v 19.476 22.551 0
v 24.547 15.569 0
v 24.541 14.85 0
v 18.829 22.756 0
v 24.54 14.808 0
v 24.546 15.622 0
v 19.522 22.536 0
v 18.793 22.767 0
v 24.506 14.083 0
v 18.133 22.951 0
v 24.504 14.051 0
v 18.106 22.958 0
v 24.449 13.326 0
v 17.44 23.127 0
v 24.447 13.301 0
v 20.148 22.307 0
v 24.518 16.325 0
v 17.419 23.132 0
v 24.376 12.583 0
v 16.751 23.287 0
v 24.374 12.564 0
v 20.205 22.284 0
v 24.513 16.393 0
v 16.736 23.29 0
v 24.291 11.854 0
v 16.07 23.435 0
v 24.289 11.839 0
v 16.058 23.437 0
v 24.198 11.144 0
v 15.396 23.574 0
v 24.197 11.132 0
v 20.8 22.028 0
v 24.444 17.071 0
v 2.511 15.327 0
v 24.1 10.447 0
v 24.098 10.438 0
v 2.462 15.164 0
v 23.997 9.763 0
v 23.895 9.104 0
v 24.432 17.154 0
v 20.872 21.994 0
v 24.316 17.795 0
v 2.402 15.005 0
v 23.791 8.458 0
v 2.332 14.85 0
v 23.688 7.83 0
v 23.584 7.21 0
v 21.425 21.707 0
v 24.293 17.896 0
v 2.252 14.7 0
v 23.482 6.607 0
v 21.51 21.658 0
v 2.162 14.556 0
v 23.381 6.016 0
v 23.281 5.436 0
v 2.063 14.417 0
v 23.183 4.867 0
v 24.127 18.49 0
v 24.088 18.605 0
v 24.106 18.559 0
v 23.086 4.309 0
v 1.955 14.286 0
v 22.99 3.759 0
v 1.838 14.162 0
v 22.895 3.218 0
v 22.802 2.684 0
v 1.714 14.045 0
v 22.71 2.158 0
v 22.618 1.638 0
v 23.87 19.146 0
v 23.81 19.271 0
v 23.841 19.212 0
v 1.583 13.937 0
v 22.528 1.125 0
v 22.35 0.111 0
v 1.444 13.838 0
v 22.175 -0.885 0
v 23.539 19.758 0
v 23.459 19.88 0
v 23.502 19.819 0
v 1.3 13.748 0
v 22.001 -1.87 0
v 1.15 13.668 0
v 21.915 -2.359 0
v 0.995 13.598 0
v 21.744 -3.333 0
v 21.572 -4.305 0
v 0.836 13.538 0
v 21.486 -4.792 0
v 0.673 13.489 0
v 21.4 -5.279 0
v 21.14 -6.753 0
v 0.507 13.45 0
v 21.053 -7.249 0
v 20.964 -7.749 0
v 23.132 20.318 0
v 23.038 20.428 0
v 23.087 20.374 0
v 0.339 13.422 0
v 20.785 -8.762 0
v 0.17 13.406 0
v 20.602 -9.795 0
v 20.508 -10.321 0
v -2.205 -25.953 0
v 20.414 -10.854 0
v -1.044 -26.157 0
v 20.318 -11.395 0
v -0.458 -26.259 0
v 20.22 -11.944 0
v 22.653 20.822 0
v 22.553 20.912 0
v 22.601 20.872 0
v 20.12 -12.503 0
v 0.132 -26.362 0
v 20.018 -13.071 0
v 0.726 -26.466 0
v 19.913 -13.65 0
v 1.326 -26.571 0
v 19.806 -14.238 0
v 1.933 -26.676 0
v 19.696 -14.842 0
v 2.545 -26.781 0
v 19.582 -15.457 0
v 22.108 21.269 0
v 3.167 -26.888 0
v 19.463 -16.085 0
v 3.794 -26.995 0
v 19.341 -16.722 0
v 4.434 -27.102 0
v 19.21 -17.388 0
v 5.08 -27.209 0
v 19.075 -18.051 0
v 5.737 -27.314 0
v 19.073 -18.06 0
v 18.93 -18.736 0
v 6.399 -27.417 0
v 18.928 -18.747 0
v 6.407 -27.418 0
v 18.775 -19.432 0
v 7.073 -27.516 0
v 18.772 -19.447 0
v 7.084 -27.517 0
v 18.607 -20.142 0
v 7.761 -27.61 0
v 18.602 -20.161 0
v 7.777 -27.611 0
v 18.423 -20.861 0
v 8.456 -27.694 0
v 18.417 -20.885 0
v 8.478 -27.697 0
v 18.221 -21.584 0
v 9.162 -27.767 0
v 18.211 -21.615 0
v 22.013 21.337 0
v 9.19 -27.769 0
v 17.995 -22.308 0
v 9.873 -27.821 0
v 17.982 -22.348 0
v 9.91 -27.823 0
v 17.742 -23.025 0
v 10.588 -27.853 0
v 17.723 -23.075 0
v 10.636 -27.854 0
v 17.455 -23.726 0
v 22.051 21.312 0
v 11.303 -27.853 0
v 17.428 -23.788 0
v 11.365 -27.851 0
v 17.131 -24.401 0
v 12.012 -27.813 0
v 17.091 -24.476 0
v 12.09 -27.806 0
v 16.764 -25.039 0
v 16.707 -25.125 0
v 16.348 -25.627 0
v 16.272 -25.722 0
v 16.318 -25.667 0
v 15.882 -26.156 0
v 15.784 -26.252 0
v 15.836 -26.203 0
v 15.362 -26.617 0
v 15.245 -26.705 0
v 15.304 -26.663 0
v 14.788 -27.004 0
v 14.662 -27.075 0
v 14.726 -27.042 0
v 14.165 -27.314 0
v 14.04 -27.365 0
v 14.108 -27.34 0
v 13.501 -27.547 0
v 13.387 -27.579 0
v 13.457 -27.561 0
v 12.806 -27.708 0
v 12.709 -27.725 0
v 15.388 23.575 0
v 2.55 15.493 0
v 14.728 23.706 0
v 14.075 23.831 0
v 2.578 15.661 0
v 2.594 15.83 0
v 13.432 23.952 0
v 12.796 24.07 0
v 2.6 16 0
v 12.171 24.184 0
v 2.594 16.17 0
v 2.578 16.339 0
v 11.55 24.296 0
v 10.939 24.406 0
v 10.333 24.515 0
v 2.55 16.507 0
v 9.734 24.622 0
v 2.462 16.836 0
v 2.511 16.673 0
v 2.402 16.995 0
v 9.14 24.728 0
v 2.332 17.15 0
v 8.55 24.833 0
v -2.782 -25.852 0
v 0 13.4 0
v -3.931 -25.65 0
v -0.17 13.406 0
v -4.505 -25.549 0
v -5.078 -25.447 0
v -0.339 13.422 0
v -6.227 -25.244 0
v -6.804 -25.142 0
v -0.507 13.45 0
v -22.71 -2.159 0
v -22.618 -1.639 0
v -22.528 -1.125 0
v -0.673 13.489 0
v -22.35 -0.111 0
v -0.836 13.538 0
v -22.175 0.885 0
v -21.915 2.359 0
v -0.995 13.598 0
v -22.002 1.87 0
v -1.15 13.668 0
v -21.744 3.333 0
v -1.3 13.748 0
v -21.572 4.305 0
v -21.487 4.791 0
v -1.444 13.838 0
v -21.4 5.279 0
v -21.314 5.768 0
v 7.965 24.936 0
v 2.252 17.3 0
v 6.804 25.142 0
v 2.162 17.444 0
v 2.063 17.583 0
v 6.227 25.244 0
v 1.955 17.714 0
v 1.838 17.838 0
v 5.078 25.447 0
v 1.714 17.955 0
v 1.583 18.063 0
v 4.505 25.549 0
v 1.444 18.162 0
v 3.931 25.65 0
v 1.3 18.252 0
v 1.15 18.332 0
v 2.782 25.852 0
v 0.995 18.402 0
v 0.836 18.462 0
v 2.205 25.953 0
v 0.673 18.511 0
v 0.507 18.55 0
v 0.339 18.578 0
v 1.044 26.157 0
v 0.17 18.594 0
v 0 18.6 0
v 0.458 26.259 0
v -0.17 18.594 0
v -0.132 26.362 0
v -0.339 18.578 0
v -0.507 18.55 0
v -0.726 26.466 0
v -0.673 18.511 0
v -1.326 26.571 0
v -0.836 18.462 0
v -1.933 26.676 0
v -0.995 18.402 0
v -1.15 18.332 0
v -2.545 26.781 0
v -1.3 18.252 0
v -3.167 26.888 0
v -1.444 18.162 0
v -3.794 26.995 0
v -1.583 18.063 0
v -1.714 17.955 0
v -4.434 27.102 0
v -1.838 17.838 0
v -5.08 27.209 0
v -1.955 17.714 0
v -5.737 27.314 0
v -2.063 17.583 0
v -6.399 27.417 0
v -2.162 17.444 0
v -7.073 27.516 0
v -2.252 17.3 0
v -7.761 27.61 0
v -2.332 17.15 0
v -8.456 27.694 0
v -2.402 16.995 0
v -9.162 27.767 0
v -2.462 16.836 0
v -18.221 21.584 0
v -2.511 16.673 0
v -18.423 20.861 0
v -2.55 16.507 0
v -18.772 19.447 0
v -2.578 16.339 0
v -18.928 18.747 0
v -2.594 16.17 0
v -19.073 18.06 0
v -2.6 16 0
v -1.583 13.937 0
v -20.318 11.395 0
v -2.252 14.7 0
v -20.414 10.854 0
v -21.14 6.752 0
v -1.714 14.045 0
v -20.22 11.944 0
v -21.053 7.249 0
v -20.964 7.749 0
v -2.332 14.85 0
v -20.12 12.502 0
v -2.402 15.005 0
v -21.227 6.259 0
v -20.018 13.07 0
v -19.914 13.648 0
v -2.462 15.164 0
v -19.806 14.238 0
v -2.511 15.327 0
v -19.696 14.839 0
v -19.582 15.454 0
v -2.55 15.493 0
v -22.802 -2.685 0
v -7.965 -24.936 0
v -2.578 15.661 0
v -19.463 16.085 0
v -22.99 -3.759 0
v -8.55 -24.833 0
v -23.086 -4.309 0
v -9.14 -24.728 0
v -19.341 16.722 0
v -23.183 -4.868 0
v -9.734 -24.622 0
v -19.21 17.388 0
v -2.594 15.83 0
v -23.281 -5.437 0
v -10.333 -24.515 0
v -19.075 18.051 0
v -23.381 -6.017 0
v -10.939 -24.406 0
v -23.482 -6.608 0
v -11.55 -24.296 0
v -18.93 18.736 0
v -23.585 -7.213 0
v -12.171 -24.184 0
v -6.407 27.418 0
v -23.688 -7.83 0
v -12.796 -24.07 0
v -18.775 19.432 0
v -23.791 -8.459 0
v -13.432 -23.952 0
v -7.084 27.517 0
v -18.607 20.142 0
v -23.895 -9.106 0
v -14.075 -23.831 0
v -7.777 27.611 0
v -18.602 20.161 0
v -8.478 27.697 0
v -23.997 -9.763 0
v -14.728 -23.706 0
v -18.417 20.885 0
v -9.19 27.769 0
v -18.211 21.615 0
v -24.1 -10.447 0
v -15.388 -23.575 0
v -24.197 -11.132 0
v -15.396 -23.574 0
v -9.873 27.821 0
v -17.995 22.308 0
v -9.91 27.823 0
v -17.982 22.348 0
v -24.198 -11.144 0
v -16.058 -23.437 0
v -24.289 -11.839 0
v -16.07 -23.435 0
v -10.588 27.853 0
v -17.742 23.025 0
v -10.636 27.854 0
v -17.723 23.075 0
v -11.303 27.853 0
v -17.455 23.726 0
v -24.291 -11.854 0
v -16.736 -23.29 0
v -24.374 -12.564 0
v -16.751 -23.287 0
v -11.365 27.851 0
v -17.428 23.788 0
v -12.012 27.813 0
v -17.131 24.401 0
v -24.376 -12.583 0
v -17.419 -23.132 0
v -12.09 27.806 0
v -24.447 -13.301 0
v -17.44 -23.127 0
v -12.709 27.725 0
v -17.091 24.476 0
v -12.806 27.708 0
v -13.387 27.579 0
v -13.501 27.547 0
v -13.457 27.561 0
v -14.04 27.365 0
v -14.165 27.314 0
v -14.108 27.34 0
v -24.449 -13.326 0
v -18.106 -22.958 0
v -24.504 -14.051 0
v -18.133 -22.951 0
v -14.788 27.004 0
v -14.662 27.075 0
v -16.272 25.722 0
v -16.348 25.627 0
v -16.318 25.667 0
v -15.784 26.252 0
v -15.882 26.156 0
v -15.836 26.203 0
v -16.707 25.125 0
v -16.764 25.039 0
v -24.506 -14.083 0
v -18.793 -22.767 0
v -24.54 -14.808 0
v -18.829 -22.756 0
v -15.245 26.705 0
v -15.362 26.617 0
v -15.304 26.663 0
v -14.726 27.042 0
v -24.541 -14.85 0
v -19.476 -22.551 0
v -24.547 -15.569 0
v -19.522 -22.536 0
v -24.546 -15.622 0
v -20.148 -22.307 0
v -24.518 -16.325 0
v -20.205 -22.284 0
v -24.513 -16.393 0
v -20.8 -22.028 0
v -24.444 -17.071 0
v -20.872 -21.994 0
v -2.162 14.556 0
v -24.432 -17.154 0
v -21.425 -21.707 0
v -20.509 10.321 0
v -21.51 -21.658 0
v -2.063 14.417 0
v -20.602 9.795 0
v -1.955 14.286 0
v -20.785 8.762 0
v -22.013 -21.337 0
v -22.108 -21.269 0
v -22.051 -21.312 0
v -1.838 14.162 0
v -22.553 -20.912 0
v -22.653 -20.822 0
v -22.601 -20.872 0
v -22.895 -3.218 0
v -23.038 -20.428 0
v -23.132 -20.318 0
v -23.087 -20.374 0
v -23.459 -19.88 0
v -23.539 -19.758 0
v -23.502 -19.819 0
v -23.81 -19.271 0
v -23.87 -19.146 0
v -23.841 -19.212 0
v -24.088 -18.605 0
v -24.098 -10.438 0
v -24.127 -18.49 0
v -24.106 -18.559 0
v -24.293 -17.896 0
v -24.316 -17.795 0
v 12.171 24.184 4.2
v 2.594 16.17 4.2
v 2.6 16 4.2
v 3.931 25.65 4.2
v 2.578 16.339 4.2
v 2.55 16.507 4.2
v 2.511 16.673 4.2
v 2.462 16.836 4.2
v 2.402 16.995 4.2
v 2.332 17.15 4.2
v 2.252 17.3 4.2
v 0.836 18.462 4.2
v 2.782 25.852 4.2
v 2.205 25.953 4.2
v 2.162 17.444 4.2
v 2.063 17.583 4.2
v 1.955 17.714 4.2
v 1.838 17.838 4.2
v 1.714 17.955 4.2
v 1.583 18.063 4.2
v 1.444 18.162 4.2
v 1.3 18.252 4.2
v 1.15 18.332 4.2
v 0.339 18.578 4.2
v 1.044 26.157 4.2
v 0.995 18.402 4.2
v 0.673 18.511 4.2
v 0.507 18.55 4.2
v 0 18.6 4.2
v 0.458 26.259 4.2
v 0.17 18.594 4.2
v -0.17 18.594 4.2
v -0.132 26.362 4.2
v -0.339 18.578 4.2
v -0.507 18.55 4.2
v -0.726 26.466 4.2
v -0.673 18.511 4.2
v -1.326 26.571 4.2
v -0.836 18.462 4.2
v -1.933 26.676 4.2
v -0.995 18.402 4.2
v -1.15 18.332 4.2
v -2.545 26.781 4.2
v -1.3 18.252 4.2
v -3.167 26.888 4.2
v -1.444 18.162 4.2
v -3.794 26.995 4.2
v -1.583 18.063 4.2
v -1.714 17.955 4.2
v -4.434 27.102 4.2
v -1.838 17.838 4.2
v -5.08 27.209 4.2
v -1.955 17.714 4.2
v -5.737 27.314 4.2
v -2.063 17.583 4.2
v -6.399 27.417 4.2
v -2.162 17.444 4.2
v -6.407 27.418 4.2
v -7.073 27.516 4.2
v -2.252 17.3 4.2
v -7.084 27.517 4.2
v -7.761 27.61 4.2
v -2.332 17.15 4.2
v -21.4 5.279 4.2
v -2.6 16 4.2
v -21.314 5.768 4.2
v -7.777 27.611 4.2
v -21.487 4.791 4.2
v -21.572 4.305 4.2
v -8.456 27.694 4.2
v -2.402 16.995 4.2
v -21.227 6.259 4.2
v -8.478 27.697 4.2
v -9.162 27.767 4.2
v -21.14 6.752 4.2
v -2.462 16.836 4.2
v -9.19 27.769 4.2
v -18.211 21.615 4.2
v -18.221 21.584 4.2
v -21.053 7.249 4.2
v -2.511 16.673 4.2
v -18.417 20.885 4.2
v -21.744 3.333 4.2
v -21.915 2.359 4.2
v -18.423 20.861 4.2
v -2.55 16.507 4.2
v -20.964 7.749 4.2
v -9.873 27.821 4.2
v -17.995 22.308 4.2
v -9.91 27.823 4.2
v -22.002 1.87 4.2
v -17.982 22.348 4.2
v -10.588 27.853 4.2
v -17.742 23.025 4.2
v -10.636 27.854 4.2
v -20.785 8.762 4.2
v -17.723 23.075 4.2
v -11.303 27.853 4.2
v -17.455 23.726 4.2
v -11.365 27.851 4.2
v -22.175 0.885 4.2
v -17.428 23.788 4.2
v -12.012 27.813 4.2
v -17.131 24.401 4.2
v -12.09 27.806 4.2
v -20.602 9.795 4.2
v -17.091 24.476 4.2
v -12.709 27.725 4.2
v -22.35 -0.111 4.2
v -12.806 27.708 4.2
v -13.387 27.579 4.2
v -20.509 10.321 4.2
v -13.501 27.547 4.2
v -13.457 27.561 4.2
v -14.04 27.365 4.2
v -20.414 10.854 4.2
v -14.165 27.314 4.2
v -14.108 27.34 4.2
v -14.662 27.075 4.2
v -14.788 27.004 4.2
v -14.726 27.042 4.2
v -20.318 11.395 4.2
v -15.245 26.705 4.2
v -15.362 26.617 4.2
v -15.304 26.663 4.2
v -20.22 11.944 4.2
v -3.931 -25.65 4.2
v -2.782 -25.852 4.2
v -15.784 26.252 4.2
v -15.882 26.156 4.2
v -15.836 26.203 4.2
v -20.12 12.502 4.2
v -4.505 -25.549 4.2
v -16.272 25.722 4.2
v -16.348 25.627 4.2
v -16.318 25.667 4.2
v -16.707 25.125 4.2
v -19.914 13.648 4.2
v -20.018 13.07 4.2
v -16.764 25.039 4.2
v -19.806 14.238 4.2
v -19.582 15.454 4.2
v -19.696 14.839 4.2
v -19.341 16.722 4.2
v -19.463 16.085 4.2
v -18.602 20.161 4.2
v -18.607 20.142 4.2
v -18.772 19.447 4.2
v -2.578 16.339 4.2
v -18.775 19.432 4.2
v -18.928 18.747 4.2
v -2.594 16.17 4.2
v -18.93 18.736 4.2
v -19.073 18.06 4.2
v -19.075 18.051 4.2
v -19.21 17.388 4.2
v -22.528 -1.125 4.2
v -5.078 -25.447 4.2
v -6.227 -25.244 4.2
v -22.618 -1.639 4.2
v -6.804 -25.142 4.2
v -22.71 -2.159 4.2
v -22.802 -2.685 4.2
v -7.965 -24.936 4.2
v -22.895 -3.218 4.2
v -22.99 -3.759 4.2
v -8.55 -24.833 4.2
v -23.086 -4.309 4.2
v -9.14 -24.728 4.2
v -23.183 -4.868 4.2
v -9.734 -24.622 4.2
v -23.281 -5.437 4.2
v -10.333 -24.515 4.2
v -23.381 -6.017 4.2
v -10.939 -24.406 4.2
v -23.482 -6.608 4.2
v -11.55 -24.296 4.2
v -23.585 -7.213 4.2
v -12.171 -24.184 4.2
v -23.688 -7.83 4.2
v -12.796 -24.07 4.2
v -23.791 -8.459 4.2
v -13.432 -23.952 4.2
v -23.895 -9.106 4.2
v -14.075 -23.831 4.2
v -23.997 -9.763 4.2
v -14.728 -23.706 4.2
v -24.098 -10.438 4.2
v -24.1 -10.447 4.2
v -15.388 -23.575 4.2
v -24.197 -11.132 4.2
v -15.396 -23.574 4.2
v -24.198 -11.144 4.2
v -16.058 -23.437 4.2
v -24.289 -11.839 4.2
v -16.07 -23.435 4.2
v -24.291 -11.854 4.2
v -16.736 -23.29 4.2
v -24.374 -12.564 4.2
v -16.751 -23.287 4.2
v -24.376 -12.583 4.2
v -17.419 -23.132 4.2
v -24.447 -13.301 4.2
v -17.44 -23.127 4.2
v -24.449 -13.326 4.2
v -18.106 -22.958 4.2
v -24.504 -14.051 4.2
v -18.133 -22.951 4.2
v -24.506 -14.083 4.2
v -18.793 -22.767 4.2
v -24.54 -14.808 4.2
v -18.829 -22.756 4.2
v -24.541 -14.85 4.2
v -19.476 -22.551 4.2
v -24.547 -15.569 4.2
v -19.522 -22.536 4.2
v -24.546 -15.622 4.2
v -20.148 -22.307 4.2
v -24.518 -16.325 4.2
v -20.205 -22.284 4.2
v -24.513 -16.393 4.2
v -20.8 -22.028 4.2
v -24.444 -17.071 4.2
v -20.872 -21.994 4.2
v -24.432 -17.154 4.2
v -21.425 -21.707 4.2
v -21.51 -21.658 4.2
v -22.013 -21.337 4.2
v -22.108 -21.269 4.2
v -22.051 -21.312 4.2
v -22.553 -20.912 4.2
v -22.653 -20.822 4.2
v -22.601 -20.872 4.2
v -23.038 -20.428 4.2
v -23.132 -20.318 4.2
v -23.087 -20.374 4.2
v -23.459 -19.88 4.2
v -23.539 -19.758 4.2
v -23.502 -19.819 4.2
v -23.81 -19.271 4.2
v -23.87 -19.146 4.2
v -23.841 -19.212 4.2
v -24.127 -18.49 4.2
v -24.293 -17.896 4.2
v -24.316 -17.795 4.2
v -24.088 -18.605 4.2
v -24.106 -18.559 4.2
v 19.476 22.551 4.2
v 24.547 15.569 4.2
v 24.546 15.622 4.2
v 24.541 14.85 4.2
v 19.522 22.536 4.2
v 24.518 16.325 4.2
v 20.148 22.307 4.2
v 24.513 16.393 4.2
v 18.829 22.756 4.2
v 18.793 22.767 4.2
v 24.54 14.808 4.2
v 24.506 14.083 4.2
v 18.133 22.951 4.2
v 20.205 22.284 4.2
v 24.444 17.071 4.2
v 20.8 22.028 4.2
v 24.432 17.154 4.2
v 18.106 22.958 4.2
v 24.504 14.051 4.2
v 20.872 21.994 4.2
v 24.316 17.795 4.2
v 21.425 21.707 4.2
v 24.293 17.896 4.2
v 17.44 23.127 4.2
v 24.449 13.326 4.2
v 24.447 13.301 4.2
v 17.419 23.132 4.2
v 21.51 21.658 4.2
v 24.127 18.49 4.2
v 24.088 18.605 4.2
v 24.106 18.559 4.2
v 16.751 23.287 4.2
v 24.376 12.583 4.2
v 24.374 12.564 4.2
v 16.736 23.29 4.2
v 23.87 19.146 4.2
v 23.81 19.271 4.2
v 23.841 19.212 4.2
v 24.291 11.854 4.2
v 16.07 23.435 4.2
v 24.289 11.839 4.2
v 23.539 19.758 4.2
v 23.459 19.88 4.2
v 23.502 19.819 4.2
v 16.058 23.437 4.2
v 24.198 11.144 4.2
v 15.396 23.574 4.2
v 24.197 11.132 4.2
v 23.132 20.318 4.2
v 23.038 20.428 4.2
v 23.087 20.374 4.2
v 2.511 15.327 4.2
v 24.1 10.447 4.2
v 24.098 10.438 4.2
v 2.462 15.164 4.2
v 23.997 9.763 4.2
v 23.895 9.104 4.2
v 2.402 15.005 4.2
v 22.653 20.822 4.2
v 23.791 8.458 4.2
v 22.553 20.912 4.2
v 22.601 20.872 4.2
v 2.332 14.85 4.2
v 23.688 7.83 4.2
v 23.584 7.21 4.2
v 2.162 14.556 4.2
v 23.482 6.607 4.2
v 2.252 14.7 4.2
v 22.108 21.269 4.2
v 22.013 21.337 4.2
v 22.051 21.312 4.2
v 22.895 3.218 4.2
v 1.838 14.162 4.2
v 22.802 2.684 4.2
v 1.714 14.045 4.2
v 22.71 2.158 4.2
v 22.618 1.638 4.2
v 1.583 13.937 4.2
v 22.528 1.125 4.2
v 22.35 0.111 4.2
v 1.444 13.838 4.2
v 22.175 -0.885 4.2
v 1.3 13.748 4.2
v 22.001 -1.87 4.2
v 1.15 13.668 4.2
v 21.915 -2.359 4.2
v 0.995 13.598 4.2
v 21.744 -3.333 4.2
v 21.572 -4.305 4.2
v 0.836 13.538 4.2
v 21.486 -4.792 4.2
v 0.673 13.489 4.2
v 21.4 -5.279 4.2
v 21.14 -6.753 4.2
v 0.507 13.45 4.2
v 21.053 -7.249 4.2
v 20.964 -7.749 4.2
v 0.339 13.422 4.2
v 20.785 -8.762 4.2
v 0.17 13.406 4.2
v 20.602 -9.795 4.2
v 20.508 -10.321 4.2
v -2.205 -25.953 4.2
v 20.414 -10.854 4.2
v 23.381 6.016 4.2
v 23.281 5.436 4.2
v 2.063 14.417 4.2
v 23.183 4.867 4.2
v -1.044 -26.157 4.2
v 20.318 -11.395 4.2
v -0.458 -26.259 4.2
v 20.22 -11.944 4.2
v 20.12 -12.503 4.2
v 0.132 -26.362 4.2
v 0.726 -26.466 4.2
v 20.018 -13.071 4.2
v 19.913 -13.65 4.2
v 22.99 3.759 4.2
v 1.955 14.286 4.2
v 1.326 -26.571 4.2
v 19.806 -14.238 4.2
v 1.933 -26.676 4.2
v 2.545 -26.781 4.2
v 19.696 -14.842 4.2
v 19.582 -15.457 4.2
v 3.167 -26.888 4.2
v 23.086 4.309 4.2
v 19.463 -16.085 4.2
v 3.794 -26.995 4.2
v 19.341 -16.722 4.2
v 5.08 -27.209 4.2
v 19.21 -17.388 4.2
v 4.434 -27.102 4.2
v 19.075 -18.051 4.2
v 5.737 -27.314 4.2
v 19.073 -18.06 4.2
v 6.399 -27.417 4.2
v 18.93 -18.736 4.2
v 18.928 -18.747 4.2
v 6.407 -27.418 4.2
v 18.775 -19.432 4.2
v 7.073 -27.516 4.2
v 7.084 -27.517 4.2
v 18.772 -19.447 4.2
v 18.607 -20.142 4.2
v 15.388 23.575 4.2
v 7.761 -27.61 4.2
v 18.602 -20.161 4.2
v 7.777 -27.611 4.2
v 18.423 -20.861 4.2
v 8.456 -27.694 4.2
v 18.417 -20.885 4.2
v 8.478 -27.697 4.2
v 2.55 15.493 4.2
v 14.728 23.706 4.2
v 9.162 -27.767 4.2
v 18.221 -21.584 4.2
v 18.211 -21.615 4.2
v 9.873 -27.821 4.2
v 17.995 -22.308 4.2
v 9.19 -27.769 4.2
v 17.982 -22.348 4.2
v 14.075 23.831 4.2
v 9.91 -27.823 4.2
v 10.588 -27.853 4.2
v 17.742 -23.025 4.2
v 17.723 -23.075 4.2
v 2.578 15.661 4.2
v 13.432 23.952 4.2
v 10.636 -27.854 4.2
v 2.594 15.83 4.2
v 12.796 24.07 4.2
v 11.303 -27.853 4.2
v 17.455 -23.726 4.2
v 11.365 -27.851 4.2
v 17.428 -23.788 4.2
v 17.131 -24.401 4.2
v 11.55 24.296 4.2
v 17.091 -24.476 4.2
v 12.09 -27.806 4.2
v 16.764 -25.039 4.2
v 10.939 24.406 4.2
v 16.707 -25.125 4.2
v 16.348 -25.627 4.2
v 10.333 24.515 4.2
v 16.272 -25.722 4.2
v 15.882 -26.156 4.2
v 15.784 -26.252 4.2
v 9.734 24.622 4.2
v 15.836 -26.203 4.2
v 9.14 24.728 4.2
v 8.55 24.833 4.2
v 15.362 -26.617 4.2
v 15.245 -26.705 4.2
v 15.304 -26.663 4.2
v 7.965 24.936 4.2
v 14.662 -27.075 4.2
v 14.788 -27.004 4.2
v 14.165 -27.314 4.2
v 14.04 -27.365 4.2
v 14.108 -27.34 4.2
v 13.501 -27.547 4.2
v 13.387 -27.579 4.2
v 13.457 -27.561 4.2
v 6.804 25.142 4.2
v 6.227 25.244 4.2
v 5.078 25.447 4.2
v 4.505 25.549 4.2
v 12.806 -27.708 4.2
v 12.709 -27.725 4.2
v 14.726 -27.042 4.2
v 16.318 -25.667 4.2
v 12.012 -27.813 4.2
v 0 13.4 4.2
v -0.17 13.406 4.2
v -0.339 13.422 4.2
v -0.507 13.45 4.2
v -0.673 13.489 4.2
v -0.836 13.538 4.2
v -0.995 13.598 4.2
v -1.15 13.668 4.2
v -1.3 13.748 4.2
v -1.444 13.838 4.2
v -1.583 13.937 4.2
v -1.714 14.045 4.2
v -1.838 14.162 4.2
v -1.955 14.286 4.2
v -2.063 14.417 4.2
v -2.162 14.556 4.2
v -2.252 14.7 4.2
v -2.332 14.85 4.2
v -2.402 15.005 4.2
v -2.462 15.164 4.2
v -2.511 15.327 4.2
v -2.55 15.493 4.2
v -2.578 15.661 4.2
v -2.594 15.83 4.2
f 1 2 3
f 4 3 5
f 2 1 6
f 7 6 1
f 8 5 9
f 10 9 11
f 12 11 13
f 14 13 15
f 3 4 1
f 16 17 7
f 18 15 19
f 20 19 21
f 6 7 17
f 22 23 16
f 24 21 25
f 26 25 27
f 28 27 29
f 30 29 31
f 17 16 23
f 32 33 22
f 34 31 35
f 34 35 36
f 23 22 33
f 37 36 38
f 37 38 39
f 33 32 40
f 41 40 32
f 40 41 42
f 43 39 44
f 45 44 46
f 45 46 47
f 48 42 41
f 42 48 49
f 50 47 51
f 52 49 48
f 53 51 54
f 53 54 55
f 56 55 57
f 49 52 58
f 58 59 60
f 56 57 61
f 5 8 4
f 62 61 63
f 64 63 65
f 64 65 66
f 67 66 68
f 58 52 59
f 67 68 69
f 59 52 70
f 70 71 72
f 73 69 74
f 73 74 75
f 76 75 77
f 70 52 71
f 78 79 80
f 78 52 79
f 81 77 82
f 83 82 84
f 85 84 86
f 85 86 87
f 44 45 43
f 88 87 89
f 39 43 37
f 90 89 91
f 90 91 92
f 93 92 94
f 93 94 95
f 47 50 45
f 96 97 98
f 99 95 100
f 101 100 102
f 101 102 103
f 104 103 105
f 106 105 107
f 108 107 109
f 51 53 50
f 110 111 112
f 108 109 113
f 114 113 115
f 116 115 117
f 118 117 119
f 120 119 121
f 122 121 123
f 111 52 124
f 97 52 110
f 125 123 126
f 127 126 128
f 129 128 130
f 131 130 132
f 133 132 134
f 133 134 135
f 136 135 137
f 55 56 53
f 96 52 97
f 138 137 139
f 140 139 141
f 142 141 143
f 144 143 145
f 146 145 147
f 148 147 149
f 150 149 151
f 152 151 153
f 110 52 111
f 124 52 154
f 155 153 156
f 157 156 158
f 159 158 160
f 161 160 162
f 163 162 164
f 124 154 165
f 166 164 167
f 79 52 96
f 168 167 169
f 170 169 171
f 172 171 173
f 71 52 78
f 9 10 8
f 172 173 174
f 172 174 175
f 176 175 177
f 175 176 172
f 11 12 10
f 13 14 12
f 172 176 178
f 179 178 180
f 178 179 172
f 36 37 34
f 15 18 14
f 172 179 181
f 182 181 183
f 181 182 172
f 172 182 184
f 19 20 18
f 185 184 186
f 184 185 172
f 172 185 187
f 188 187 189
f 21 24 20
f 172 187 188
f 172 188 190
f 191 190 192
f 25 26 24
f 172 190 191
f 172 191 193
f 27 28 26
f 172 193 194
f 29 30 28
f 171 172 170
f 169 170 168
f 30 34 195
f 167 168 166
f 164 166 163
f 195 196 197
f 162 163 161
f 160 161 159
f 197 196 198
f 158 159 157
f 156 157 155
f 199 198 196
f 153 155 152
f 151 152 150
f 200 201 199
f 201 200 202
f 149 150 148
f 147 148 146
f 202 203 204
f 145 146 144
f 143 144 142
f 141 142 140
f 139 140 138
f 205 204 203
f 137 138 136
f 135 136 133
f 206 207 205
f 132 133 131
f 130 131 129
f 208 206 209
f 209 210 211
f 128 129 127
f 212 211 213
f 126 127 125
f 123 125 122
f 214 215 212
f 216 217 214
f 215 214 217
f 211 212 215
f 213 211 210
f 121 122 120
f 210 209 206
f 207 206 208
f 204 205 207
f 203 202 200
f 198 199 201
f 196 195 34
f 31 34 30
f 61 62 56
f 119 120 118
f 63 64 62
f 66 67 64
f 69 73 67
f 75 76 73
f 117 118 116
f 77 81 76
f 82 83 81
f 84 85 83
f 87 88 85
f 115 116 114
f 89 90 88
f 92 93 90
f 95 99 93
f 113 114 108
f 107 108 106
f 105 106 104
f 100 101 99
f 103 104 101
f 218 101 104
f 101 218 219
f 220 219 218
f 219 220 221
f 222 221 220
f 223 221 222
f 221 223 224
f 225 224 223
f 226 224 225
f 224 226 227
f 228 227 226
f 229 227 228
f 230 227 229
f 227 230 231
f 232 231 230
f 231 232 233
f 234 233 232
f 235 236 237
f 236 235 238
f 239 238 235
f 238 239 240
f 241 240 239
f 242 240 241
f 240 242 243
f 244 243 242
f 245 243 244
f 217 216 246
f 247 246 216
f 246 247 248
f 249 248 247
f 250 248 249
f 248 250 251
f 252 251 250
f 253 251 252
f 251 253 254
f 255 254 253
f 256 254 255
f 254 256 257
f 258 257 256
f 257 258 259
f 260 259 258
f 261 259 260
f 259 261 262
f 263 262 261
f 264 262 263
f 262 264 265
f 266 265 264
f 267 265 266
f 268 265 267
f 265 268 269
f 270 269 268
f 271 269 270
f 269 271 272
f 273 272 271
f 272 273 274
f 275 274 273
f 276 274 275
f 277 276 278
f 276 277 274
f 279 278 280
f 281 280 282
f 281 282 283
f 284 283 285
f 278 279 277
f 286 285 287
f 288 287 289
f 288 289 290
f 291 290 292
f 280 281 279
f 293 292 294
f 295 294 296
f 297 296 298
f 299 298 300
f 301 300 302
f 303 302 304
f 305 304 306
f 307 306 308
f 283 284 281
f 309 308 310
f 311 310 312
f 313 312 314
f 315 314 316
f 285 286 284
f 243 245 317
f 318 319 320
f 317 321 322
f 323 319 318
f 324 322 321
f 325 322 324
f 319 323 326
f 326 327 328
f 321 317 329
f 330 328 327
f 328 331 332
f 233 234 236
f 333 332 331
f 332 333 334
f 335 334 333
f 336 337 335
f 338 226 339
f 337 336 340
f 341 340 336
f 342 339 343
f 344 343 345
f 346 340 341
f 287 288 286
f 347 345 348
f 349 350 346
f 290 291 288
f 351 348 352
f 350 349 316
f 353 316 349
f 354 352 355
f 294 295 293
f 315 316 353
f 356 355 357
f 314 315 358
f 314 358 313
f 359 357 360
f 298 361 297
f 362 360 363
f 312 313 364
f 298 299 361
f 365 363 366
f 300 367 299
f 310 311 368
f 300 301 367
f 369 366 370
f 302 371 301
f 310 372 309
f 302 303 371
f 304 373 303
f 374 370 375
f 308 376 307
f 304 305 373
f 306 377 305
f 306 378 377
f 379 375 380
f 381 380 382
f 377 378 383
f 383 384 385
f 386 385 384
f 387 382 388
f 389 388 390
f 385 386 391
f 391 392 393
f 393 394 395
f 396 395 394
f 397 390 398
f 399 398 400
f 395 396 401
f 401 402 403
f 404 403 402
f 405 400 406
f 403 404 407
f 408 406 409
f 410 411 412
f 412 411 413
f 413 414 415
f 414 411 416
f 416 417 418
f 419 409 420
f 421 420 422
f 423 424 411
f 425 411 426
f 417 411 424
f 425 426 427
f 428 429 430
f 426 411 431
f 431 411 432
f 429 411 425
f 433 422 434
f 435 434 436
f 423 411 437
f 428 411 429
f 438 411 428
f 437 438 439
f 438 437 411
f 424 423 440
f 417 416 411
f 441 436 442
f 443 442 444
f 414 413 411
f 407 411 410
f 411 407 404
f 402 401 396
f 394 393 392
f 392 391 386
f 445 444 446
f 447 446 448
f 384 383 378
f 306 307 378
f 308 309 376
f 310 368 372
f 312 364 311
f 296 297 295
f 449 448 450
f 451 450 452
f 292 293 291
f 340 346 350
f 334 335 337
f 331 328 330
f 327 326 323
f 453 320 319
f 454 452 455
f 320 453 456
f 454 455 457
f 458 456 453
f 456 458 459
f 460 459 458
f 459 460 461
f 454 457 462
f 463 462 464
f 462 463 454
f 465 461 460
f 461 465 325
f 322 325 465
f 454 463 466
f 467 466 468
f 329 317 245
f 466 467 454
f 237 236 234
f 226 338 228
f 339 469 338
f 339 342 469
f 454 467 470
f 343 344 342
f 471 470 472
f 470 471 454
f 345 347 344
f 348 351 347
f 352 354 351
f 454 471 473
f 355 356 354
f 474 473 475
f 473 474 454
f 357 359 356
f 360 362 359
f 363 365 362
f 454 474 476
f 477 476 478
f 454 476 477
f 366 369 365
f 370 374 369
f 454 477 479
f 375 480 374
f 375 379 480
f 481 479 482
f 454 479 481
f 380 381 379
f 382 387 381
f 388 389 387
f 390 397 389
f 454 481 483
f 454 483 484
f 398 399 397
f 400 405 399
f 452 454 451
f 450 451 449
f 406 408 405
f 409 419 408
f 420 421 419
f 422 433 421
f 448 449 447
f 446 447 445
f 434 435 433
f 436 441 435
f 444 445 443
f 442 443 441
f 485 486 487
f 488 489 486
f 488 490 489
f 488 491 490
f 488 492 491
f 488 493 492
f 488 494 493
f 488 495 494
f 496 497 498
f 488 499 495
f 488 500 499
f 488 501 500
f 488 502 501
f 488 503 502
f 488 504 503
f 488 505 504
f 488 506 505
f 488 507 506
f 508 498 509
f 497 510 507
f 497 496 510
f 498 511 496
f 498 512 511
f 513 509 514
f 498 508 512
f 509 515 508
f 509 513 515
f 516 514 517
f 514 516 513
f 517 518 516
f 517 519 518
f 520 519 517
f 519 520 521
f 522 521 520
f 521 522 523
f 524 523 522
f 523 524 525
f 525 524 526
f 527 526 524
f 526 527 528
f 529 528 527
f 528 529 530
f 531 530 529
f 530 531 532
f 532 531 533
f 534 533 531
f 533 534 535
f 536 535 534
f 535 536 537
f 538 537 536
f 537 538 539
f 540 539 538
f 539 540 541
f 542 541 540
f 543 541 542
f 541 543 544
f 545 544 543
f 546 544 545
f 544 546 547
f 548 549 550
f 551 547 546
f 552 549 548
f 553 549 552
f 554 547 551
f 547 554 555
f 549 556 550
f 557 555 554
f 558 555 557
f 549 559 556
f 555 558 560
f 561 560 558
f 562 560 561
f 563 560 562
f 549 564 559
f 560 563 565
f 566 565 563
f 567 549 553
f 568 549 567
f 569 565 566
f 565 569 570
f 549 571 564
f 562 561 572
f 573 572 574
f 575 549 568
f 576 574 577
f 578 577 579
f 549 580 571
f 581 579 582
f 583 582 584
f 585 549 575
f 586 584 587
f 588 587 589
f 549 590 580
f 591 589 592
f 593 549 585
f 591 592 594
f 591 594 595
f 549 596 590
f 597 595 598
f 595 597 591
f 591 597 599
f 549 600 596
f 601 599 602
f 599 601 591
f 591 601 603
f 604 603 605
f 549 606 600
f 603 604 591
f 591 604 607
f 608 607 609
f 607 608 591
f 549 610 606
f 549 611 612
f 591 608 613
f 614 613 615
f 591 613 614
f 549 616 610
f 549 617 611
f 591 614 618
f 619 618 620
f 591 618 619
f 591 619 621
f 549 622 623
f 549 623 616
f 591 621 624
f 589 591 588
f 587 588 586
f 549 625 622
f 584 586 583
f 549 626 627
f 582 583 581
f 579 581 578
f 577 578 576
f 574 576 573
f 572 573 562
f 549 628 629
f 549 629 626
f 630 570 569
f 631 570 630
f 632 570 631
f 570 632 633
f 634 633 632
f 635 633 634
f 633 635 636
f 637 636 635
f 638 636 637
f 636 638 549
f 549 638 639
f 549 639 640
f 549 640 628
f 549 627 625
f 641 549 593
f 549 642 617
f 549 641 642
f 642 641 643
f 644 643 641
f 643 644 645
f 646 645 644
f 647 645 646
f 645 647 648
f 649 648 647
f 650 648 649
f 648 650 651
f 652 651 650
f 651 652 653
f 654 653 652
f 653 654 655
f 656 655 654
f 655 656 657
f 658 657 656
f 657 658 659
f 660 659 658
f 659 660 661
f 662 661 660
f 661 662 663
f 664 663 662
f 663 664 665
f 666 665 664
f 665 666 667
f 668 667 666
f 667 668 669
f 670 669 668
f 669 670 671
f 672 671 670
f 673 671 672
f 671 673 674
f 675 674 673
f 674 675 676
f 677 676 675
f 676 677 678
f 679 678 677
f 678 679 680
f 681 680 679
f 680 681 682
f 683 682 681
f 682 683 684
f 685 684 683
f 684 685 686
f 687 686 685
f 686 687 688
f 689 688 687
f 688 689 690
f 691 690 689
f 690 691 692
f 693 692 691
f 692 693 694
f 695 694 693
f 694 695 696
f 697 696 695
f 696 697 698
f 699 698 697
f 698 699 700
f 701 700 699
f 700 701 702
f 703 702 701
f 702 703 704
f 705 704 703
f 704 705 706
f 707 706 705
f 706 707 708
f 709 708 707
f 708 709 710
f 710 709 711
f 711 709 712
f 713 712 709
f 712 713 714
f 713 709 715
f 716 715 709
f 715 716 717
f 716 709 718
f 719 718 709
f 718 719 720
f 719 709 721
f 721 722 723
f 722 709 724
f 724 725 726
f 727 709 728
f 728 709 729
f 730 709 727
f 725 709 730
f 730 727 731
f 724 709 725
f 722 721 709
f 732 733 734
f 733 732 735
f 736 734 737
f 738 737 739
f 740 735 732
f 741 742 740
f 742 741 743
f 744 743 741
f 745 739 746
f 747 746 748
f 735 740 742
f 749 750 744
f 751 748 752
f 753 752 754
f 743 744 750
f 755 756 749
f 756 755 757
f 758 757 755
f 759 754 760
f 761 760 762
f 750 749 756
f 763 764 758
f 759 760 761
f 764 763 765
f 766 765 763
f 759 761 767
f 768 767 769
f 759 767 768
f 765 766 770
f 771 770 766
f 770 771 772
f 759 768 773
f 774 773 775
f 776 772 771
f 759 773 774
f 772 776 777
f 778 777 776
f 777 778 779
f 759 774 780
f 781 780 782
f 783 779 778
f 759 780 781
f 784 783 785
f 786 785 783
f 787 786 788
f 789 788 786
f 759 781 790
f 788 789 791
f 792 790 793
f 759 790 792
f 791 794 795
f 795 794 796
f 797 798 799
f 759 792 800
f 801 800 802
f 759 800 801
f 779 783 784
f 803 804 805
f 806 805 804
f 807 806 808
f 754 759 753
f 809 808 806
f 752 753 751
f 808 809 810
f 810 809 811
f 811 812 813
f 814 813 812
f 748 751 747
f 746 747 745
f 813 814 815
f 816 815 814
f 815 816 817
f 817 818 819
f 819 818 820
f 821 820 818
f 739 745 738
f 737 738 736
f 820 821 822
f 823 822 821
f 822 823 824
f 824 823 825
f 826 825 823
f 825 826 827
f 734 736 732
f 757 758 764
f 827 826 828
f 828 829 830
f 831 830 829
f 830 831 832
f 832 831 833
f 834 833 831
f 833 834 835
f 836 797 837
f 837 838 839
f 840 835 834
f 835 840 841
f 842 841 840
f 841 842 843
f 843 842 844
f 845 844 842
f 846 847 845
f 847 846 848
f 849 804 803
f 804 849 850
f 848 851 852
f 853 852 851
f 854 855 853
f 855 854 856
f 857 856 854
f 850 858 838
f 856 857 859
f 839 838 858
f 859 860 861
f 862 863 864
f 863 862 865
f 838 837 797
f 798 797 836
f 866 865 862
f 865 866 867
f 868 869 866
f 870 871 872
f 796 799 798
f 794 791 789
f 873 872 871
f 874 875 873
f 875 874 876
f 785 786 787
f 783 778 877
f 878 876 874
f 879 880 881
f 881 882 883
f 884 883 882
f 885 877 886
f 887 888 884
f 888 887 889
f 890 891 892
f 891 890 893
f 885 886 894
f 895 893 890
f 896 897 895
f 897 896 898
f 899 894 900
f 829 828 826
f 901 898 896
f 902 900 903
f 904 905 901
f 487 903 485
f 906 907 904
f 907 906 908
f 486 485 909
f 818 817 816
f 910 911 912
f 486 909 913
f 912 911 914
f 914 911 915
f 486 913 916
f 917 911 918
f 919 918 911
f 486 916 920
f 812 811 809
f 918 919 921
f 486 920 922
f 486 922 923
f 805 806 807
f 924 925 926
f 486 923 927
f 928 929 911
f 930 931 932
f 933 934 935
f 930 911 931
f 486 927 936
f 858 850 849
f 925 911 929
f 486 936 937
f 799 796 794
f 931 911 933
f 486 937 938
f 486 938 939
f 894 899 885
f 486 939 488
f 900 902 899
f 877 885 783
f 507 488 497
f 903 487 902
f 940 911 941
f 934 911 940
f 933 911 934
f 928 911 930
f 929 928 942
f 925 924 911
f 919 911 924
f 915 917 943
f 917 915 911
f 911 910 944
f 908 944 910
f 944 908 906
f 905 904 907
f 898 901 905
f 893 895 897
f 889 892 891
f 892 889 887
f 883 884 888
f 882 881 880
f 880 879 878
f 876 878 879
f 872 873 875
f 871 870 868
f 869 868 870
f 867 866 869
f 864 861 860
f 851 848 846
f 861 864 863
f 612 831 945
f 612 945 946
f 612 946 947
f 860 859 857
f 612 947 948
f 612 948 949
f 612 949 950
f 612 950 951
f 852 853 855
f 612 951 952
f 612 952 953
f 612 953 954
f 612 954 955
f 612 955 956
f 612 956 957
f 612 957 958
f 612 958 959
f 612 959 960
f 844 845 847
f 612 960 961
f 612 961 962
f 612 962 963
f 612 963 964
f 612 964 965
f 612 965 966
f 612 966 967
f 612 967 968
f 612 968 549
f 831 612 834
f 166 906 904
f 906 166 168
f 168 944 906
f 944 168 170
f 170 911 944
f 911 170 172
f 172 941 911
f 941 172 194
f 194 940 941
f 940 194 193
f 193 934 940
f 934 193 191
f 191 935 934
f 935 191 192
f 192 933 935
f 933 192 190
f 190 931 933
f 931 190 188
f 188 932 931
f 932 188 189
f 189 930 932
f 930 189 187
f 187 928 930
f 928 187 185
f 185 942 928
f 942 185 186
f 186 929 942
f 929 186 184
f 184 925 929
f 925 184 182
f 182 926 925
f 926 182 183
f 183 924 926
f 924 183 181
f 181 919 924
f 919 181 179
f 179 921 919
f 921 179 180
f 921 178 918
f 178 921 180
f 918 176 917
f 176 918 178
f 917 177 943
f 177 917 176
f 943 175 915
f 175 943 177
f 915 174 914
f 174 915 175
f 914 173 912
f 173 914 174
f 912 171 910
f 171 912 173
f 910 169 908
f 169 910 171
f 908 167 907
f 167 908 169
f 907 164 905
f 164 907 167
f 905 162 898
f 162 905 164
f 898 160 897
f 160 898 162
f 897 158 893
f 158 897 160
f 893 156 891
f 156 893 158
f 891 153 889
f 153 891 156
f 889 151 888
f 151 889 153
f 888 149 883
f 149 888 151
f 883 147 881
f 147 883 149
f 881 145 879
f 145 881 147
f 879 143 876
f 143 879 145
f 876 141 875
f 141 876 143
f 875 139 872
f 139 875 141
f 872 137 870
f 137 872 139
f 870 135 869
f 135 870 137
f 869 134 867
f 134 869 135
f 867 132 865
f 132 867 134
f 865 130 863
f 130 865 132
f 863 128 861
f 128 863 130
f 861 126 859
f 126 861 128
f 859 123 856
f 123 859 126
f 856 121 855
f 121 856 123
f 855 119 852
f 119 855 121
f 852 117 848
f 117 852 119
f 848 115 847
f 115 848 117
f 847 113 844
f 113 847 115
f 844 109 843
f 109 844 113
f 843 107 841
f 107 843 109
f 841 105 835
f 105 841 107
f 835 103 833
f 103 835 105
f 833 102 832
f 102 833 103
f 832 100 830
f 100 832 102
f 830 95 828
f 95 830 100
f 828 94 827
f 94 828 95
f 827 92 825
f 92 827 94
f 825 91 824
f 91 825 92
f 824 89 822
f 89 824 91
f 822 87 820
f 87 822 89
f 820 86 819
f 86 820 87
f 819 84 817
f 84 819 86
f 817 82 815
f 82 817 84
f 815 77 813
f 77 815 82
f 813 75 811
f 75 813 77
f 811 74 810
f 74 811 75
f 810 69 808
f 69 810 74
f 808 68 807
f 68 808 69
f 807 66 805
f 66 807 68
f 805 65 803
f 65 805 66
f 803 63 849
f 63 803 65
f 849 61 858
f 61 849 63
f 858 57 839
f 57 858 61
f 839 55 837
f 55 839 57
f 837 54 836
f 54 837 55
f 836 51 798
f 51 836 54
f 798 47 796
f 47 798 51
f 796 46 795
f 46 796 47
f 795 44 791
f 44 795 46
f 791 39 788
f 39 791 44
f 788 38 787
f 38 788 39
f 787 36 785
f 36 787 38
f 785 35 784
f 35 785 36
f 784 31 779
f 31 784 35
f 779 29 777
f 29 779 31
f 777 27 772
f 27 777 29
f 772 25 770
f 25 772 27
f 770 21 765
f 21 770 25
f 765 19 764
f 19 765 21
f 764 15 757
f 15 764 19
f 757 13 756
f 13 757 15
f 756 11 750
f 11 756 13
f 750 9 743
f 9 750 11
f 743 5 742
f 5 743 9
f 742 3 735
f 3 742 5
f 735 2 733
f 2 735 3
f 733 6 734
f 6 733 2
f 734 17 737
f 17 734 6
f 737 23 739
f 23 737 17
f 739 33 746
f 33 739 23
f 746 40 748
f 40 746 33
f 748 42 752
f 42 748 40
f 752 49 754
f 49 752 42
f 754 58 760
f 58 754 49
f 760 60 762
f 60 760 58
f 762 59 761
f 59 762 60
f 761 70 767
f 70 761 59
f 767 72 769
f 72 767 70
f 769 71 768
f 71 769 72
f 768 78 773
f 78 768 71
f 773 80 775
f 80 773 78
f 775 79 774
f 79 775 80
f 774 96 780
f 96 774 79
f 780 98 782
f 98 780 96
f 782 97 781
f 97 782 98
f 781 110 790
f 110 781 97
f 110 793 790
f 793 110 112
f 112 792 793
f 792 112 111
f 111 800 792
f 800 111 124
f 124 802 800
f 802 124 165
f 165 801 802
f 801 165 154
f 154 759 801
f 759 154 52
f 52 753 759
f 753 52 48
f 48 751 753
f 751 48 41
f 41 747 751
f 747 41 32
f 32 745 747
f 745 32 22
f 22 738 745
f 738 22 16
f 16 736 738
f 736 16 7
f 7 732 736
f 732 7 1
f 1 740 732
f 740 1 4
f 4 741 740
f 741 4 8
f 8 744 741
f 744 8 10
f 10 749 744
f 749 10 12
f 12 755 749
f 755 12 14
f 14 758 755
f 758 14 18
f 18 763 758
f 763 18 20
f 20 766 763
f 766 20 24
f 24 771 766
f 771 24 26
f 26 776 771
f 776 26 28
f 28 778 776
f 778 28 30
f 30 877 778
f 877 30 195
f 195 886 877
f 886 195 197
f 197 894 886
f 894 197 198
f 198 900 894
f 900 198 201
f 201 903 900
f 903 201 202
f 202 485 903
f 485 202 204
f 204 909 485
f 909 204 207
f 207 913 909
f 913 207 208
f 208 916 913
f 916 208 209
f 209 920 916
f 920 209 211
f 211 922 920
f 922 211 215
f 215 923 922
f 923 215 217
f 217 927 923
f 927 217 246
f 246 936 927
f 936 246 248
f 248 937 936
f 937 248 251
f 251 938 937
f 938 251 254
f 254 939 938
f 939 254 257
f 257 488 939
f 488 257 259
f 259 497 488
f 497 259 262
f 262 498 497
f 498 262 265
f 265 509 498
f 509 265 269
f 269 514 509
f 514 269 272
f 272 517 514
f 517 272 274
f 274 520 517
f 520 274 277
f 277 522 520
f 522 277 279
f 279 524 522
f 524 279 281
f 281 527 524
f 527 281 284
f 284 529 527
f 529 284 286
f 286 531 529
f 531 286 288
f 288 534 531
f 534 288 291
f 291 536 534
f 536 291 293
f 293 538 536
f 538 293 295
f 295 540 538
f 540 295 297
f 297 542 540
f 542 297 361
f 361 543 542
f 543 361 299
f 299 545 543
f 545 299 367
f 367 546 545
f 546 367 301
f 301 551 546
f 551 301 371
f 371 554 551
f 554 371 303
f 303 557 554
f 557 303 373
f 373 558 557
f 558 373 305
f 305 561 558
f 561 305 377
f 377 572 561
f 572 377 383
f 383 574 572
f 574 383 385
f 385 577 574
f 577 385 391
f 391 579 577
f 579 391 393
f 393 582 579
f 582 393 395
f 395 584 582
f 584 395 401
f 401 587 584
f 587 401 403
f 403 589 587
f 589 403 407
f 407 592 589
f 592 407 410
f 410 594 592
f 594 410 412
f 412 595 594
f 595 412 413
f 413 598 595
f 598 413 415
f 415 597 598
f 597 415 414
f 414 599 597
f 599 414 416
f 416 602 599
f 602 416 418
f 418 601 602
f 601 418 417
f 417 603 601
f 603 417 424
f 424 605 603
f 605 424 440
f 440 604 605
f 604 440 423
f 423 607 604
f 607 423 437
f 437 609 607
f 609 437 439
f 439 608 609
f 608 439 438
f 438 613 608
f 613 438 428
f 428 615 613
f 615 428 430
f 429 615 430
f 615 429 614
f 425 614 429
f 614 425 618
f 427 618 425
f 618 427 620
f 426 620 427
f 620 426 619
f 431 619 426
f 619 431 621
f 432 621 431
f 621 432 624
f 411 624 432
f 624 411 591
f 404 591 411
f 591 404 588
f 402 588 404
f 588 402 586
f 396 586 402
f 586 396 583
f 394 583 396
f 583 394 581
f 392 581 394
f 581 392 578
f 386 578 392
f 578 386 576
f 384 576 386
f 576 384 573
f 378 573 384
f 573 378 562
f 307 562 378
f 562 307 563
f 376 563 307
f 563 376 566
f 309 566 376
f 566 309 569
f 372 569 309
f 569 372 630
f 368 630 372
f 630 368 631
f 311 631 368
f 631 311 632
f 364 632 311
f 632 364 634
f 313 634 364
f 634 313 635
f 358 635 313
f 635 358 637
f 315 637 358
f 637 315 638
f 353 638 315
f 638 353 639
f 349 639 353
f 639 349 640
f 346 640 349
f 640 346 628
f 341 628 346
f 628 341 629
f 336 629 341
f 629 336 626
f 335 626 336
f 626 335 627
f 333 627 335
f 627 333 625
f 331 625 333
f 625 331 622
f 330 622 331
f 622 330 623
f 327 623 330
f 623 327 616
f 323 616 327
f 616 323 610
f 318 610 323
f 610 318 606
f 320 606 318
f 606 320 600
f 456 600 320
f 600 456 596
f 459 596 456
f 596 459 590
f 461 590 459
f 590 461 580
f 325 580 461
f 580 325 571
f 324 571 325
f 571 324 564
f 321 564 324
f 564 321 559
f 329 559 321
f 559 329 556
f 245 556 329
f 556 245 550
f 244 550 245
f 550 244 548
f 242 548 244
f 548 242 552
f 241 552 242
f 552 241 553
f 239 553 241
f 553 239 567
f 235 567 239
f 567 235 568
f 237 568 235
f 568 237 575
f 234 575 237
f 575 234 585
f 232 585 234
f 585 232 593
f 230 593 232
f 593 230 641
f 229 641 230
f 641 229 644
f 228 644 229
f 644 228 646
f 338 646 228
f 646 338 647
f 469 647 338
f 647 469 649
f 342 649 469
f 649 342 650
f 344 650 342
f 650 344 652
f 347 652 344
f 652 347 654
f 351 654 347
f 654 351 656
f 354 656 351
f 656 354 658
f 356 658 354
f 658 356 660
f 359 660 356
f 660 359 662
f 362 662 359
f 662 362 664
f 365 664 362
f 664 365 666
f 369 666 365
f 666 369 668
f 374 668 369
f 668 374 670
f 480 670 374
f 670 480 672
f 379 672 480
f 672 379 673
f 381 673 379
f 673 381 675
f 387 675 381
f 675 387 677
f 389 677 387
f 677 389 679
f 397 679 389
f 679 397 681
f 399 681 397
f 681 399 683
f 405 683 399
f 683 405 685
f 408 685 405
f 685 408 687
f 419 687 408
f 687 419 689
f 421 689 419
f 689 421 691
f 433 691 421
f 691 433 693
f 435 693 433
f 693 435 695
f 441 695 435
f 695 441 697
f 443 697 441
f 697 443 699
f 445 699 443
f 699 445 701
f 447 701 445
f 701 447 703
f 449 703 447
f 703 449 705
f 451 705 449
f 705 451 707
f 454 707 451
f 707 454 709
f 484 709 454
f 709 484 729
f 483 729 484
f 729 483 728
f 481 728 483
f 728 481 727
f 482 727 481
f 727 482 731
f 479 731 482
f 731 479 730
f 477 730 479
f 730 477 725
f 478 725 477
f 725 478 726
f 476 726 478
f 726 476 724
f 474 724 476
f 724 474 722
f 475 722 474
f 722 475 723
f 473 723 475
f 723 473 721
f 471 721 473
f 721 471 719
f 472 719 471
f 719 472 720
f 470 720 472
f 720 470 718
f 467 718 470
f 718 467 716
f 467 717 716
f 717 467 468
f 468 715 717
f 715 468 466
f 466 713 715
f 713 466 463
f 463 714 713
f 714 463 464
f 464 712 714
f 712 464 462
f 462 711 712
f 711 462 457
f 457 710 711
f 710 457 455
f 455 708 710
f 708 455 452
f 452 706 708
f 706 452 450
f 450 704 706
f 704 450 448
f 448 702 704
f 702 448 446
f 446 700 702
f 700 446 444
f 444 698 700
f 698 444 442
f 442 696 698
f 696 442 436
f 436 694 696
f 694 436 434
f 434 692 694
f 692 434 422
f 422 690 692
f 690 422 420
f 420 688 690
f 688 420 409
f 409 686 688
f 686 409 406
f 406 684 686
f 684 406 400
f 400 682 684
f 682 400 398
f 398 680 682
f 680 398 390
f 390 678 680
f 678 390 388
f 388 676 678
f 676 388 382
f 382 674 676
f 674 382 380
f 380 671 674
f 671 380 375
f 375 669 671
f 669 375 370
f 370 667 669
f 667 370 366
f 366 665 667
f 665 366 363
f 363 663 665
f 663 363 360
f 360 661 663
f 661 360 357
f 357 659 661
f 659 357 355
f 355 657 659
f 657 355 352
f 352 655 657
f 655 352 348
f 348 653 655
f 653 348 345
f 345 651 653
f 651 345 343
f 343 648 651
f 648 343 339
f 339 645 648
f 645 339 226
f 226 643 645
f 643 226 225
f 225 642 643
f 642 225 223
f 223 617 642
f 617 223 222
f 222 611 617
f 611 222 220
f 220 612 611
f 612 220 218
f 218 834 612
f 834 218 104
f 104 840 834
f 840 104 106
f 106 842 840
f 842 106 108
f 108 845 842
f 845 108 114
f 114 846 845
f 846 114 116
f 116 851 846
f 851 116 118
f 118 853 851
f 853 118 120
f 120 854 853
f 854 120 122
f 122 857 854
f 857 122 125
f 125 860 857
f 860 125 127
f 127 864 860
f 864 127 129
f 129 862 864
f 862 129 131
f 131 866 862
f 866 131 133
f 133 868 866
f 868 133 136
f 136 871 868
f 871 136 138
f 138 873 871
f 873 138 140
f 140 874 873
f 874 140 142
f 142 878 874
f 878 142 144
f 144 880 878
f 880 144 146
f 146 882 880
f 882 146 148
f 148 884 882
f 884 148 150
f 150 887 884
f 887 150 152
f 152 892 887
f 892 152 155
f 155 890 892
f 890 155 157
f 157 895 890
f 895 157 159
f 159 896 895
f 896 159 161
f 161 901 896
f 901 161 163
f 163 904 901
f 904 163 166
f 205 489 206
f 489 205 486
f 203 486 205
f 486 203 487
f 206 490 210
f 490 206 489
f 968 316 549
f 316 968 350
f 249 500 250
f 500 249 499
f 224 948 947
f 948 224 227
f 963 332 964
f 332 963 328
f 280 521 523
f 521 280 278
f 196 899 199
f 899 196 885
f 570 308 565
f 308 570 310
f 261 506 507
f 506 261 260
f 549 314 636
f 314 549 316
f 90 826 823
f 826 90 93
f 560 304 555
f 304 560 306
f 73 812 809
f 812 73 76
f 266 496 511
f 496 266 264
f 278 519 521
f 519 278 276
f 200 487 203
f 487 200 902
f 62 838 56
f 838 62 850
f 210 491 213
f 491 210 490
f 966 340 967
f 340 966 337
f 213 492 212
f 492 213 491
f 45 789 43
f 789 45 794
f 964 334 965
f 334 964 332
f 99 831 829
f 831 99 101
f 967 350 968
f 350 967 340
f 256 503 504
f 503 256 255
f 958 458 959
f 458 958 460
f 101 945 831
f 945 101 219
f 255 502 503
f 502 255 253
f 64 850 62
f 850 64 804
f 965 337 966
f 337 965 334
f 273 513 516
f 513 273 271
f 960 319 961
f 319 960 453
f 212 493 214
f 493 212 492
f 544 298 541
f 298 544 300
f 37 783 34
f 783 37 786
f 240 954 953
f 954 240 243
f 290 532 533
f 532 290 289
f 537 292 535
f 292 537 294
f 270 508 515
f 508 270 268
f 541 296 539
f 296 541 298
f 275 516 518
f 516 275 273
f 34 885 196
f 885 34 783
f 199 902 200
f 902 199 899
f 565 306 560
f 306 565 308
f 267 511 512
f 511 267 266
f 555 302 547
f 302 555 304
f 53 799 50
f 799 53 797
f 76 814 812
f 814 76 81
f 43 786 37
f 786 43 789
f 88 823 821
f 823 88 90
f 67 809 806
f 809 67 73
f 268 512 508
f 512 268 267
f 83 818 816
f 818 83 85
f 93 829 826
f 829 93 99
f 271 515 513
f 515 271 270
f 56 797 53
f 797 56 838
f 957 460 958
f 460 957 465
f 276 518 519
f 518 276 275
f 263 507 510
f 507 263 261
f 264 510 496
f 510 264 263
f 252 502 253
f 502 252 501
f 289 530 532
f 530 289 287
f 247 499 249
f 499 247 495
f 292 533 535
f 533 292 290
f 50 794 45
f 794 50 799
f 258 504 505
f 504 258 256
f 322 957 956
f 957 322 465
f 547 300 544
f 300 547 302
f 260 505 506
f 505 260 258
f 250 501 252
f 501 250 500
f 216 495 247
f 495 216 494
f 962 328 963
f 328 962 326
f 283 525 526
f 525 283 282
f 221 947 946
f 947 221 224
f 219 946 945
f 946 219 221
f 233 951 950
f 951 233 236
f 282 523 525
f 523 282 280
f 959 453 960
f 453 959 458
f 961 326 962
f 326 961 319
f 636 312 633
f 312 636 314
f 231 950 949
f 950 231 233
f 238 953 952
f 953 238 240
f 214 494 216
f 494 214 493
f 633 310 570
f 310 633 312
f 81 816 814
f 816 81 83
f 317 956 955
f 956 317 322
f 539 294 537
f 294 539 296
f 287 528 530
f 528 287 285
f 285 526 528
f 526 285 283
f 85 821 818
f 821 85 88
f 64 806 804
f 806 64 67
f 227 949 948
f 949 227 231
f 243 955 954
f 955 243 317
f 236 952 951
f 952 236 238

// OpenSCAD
$fn=96;
thickness_mm = 4.2;
pts = [[21.6581, -3.8189], [21.7438, -3.3328], [21.8295, -2.8462], [21.9154, -2.3587], [22.0015, -1.8696], [22.088, -1.3786], [22.1749, -0.8851], [22.2622, -0.3886], [22.3501, 0.1114], [22.4387, 0.6156], [22.5281, 1.1243], [22.6183, 1.6384], [22.7096, 2.1581], [22.8018, 2.6844], [22.8951, 3.2177], [22.9897, 3.7588], [23.0855, 4.3084], [23.1826, 4.8672], [23.281, 5.436], [23.3808, 6.0157], [23.4819, 6.6068], [23.5842, 7.2104], [23.6873, 7.8273], [23.791, 8.4582], [23.8948, 9.104], [23.9979, 9.7655], [24.0992, 10.443], [24.1973, 11.1368], [24.29, 11.8471], [24.3748, 12.5731], [24.4481, 13.3137], [24.5053, 14.0668], [24.5405, 14.8289], [24.547, 15.5952], [24.5163, 16.3592], [24.4395, 17.1127], [24.3072, 17.8461], [24.1108, 18.5487], [23.844, 19.2102], [23.503, 19.8215], [23.0887, 20.3759], [22.6057, 20.8704], [22.0623, 21.3053], [21.4688, 21.684], [20.8366, 22.0122], [20.1768, 22.2965], [19.4989, 22.5442], [18.811, 22.7617], [18.1195, 22.955], [17.4292, 23.1293], [16.7433, 23.2885], [16.0641, 23.436], [15.393, 23.5743], [14.7307, 23.7054], [14.0774, 23.8308], [13.4333, 23.9518], [12.7978, 24.0692], [12.1707, 24.1838], [11.5514, 24.2959], [10.9393, 24.4061], [10.3338, 24.5146], [9.7342, 24.6217], [9.14, 24.7276], [8.5505, 24.8325], [7.9651, 24.9364], [7.3832, 25.0396], [6.8041, 25.1423], [6.2273, 25.2444], [5.6522, 25.346], [5.0782, 25.4474], [4.5049, 25.5486], [3.9315, 25.6496], [3.3575, 25.7506], [2.7823, 25.8518], [2.2054, 25.9531], [1.6262, 26.0547], [1.044, 26.1568], [0.4584, 26.2593], [-0.1314, 26.3624], [-0.726, 26.4662], [-1.3261, 26.5705], [-1.9322, 26.6757], [-2.5451, 26.7815], [-3.1653, 26.8879], [-3.7938, 26.9948], [-4.4311, 27.1018], [-5.0779, 27.2084], [-5.7346, 27.314], [-6.4018, 27.4173], [-7.0797, 27.5168], [-7.7684, 27.6105], [-8.4673, 27.6956], [-9.1757, 27.7679], [-9.8916, 27.8227], [-10.6124, 27.8536], [-11.3341, 27.8527], [-12.0514, 27.8112], [-12.7578, 27.7191], [-13.4449, 27.5662], [-14.1043, 27.3434], [-14.7273, 27.0439], [-15.3063, 26.6646], [-15.8357, 26.2068], [-16.3128, 25.6765], [-16.7376, 25.0834], [-17.1127, 24.4395], [-17.4426, 23.7577], [-17.7328, 23.0502], [-17.9888, 22.3279], [-18.2163, 21.5998], [-18.4202, 20.8725], [-18.6046, 20.1515], [-18.7732, 19.4403], [-18.929, 18.7411], [-19.0742, 18.0556], [-19.2107, 17.3843], [-19.34, 16.7275], [-19.4633, 16.0851], [-19.5817, 15.4567], [-19.6958, 14.8418], [-19.8061, 14.2396], [-19.9133, 13.6496], [-20.0178, 13.0707], [-20.1198, 12.5026], [-20.2197, 11.9443], [-20.3176, 11.395], [-20.4138, 10.8542], [-20.5085, 10.3212], [-20.6019, 9.7951], [-20.6939, 9.2755], [-20.7849, 8.7616], [-20.8749, 8.253], [-20.9641, 7.7489], [-21.0526, 7.249], [-21.1403, 6.7526], [-21.2274, 6.2591], [-21.3141, 5.7681], [-21.4004, 5.279], [-21.4865, 4.7916], [-21.5724, 4.305], [-21.6581, 3.8189], [-21.7438, 3.3328], [-21.8295, 2.8462], [-21.9154, 2.3587], [-22.0015, 1.8696], [-22.088, 1.3786], [-22.1749, 0.8851], [-22.2622, 0.3886], [-22.3501, -0.1114], [-22.4387, -0.6156], [-22.5281, -1.1243], [-22.6183, -1.6384], [-22.7096, -2.1581], [-22.8018, -2.6844], [-22.8951, -3.2177], [-22.9897, -3.7588], [-23.0855, -4.3084], [-23.1826, -4.8672], [-23.281, -5.436], [-23.3808, -6.0157], [-23.4819, -6.6068], [-23.5842, -7.2104], [-23.6873, -7.8273], [-23.791, -8.4582], [-23.8948, -9.104], [-23.9979, -9.7655], [-24.0992, -10.443], [-24.1973, -11.1368], [-24.29, -11.8471], [-24.3748, -12.5731], [-24.4481, -13.3137], [-24.5053, -14.0668], [-24.5405, -14.8289], [-24.547, -15.5952], [-24.5163, -16.3592], [-24.4395, -17.1127], [-24.3072, -17.8461], [-24.1108, -18.5487], [-23.844, -19.2102], [-23.503, -19.8215], [-23.0887, -20.3759], [-22.6057, -20.8704], [-22.0623, -21.3053], [-21.4688, -21.684], [-20.8366, -22.0122], [-20.1768, -22.2965], [-19.4989, -22.5442], [-18.811, -22.7617], [-18.1195, -22.955], [-17.4292, -23.1293], [-16.7433, -23.2885], [-16.0641, -23.436], [-15.393, -23.5743], [-14.7307, -23.7054], [-14.0774, -23.8308], [-13.4333, -23.9518], [-12.7978, -24.0692], [-12.1707, -24.1838], [-11.5514, -24.2959], [-10.9393, -24.4061], [-10.3338, -24.5146], [-9.7342, -24.6217], [-9.14, -24.7276], [-8.5505, -24.8325], [-7.9651, -24.9364], [-7.3832, -25.0396], [-6.8041, -25.1423], [-6.2273, -25.2444], [-5.6522, -25.346], [-5.0782, -25.4474], [-4.5049, -25.5486], [-3.9315, -25.6496], [-3.3575, -25.7506], [-2.7823, -25.8518], [-2.2054, -25.9531], [-1.6262, -26.0547], [-1.044, -26.1568], [-0.4584, -26.2593], [0.1314, -26.3624], [0.726, -26.4662], [1.3261, -26.5705], [1.9322, -26.6757], [2.5451, -26.7815], [3.1653, -26.8879], [3.7938, -26.9948], [4.4311, -27.1018], [5.0779, -27.2084], [5.7346, -27.314], [6.4018, -27.4173], [7.0797, -27.5168], [7.7684, -27.6105], [8.4673, -27.6956], [9.1757, -27.7679], [9.8916, -27.8227], [10.6124, -27.8536], [11.3341, -27.8527], [12.0514, -27.8112], [12.7578, -27.7191], [13.4449, -27.5662], [14.1043, -27.3434], [14.7273, -27.0439], [15.3063, -26.6646], [15.8357, -26.2068], [16.3128, -25.6765], [16.7376, -25.0834], [17.1127, -24.4395], [17.4426, -23.7577], [17.7328, -23.0502], [17.9888, -22.3279], [18.2163, -21.5998], [18.4202, -20.8725], [18.6046, -20.1515], [18.7732, -19.4403], [18.929, -18.7411], [19.0742, -18.0556], [19.2107, -17.3843], [19.34, -16.7275], [19.4633, -16.0851], [19.5817, -15.4567], [19.6958, -14.8418], [19.8061, -14.2396], [19.9133, -13.6496], [20.0178, -13.0707], [20.1198, -12.5026], [20.2197, -11.9443], [20.3176, -11.395], [20.4138, -10.8542], [20.5085, -10.3212], [20.6019, -9.7951], [20.6939, -9.2755], [20.7849, -8.7616], [20.8749, -8.253], [20.9641, -7.7489], [21.0526, -7.249], [21.1403, -6.7526], [21.2274, -6.2591], [21.3141, -5.7681], [21.4004, -5.279], [21.4865, -4.7916], [21.5724, -4.305]];
hole = [0.0, 16.0, 2.6];
offset_r = 1.1;
module shape2d(){
  // CGAL fix + style control
  offset(r=offset_r) offset(r=-offset_r)
    polygon(points=pts, paths=[[for(i=[0:len(pts)-1]) i]]);
}
module body(){
  linear_extrude(height=thickness_mm, convexity=10)
    shape2d();
}
difference(){
  body();
  translate([hole[0], hole[1], -1])
    cylinder(h=thickness_mm+2, r=hole[2]);
}
